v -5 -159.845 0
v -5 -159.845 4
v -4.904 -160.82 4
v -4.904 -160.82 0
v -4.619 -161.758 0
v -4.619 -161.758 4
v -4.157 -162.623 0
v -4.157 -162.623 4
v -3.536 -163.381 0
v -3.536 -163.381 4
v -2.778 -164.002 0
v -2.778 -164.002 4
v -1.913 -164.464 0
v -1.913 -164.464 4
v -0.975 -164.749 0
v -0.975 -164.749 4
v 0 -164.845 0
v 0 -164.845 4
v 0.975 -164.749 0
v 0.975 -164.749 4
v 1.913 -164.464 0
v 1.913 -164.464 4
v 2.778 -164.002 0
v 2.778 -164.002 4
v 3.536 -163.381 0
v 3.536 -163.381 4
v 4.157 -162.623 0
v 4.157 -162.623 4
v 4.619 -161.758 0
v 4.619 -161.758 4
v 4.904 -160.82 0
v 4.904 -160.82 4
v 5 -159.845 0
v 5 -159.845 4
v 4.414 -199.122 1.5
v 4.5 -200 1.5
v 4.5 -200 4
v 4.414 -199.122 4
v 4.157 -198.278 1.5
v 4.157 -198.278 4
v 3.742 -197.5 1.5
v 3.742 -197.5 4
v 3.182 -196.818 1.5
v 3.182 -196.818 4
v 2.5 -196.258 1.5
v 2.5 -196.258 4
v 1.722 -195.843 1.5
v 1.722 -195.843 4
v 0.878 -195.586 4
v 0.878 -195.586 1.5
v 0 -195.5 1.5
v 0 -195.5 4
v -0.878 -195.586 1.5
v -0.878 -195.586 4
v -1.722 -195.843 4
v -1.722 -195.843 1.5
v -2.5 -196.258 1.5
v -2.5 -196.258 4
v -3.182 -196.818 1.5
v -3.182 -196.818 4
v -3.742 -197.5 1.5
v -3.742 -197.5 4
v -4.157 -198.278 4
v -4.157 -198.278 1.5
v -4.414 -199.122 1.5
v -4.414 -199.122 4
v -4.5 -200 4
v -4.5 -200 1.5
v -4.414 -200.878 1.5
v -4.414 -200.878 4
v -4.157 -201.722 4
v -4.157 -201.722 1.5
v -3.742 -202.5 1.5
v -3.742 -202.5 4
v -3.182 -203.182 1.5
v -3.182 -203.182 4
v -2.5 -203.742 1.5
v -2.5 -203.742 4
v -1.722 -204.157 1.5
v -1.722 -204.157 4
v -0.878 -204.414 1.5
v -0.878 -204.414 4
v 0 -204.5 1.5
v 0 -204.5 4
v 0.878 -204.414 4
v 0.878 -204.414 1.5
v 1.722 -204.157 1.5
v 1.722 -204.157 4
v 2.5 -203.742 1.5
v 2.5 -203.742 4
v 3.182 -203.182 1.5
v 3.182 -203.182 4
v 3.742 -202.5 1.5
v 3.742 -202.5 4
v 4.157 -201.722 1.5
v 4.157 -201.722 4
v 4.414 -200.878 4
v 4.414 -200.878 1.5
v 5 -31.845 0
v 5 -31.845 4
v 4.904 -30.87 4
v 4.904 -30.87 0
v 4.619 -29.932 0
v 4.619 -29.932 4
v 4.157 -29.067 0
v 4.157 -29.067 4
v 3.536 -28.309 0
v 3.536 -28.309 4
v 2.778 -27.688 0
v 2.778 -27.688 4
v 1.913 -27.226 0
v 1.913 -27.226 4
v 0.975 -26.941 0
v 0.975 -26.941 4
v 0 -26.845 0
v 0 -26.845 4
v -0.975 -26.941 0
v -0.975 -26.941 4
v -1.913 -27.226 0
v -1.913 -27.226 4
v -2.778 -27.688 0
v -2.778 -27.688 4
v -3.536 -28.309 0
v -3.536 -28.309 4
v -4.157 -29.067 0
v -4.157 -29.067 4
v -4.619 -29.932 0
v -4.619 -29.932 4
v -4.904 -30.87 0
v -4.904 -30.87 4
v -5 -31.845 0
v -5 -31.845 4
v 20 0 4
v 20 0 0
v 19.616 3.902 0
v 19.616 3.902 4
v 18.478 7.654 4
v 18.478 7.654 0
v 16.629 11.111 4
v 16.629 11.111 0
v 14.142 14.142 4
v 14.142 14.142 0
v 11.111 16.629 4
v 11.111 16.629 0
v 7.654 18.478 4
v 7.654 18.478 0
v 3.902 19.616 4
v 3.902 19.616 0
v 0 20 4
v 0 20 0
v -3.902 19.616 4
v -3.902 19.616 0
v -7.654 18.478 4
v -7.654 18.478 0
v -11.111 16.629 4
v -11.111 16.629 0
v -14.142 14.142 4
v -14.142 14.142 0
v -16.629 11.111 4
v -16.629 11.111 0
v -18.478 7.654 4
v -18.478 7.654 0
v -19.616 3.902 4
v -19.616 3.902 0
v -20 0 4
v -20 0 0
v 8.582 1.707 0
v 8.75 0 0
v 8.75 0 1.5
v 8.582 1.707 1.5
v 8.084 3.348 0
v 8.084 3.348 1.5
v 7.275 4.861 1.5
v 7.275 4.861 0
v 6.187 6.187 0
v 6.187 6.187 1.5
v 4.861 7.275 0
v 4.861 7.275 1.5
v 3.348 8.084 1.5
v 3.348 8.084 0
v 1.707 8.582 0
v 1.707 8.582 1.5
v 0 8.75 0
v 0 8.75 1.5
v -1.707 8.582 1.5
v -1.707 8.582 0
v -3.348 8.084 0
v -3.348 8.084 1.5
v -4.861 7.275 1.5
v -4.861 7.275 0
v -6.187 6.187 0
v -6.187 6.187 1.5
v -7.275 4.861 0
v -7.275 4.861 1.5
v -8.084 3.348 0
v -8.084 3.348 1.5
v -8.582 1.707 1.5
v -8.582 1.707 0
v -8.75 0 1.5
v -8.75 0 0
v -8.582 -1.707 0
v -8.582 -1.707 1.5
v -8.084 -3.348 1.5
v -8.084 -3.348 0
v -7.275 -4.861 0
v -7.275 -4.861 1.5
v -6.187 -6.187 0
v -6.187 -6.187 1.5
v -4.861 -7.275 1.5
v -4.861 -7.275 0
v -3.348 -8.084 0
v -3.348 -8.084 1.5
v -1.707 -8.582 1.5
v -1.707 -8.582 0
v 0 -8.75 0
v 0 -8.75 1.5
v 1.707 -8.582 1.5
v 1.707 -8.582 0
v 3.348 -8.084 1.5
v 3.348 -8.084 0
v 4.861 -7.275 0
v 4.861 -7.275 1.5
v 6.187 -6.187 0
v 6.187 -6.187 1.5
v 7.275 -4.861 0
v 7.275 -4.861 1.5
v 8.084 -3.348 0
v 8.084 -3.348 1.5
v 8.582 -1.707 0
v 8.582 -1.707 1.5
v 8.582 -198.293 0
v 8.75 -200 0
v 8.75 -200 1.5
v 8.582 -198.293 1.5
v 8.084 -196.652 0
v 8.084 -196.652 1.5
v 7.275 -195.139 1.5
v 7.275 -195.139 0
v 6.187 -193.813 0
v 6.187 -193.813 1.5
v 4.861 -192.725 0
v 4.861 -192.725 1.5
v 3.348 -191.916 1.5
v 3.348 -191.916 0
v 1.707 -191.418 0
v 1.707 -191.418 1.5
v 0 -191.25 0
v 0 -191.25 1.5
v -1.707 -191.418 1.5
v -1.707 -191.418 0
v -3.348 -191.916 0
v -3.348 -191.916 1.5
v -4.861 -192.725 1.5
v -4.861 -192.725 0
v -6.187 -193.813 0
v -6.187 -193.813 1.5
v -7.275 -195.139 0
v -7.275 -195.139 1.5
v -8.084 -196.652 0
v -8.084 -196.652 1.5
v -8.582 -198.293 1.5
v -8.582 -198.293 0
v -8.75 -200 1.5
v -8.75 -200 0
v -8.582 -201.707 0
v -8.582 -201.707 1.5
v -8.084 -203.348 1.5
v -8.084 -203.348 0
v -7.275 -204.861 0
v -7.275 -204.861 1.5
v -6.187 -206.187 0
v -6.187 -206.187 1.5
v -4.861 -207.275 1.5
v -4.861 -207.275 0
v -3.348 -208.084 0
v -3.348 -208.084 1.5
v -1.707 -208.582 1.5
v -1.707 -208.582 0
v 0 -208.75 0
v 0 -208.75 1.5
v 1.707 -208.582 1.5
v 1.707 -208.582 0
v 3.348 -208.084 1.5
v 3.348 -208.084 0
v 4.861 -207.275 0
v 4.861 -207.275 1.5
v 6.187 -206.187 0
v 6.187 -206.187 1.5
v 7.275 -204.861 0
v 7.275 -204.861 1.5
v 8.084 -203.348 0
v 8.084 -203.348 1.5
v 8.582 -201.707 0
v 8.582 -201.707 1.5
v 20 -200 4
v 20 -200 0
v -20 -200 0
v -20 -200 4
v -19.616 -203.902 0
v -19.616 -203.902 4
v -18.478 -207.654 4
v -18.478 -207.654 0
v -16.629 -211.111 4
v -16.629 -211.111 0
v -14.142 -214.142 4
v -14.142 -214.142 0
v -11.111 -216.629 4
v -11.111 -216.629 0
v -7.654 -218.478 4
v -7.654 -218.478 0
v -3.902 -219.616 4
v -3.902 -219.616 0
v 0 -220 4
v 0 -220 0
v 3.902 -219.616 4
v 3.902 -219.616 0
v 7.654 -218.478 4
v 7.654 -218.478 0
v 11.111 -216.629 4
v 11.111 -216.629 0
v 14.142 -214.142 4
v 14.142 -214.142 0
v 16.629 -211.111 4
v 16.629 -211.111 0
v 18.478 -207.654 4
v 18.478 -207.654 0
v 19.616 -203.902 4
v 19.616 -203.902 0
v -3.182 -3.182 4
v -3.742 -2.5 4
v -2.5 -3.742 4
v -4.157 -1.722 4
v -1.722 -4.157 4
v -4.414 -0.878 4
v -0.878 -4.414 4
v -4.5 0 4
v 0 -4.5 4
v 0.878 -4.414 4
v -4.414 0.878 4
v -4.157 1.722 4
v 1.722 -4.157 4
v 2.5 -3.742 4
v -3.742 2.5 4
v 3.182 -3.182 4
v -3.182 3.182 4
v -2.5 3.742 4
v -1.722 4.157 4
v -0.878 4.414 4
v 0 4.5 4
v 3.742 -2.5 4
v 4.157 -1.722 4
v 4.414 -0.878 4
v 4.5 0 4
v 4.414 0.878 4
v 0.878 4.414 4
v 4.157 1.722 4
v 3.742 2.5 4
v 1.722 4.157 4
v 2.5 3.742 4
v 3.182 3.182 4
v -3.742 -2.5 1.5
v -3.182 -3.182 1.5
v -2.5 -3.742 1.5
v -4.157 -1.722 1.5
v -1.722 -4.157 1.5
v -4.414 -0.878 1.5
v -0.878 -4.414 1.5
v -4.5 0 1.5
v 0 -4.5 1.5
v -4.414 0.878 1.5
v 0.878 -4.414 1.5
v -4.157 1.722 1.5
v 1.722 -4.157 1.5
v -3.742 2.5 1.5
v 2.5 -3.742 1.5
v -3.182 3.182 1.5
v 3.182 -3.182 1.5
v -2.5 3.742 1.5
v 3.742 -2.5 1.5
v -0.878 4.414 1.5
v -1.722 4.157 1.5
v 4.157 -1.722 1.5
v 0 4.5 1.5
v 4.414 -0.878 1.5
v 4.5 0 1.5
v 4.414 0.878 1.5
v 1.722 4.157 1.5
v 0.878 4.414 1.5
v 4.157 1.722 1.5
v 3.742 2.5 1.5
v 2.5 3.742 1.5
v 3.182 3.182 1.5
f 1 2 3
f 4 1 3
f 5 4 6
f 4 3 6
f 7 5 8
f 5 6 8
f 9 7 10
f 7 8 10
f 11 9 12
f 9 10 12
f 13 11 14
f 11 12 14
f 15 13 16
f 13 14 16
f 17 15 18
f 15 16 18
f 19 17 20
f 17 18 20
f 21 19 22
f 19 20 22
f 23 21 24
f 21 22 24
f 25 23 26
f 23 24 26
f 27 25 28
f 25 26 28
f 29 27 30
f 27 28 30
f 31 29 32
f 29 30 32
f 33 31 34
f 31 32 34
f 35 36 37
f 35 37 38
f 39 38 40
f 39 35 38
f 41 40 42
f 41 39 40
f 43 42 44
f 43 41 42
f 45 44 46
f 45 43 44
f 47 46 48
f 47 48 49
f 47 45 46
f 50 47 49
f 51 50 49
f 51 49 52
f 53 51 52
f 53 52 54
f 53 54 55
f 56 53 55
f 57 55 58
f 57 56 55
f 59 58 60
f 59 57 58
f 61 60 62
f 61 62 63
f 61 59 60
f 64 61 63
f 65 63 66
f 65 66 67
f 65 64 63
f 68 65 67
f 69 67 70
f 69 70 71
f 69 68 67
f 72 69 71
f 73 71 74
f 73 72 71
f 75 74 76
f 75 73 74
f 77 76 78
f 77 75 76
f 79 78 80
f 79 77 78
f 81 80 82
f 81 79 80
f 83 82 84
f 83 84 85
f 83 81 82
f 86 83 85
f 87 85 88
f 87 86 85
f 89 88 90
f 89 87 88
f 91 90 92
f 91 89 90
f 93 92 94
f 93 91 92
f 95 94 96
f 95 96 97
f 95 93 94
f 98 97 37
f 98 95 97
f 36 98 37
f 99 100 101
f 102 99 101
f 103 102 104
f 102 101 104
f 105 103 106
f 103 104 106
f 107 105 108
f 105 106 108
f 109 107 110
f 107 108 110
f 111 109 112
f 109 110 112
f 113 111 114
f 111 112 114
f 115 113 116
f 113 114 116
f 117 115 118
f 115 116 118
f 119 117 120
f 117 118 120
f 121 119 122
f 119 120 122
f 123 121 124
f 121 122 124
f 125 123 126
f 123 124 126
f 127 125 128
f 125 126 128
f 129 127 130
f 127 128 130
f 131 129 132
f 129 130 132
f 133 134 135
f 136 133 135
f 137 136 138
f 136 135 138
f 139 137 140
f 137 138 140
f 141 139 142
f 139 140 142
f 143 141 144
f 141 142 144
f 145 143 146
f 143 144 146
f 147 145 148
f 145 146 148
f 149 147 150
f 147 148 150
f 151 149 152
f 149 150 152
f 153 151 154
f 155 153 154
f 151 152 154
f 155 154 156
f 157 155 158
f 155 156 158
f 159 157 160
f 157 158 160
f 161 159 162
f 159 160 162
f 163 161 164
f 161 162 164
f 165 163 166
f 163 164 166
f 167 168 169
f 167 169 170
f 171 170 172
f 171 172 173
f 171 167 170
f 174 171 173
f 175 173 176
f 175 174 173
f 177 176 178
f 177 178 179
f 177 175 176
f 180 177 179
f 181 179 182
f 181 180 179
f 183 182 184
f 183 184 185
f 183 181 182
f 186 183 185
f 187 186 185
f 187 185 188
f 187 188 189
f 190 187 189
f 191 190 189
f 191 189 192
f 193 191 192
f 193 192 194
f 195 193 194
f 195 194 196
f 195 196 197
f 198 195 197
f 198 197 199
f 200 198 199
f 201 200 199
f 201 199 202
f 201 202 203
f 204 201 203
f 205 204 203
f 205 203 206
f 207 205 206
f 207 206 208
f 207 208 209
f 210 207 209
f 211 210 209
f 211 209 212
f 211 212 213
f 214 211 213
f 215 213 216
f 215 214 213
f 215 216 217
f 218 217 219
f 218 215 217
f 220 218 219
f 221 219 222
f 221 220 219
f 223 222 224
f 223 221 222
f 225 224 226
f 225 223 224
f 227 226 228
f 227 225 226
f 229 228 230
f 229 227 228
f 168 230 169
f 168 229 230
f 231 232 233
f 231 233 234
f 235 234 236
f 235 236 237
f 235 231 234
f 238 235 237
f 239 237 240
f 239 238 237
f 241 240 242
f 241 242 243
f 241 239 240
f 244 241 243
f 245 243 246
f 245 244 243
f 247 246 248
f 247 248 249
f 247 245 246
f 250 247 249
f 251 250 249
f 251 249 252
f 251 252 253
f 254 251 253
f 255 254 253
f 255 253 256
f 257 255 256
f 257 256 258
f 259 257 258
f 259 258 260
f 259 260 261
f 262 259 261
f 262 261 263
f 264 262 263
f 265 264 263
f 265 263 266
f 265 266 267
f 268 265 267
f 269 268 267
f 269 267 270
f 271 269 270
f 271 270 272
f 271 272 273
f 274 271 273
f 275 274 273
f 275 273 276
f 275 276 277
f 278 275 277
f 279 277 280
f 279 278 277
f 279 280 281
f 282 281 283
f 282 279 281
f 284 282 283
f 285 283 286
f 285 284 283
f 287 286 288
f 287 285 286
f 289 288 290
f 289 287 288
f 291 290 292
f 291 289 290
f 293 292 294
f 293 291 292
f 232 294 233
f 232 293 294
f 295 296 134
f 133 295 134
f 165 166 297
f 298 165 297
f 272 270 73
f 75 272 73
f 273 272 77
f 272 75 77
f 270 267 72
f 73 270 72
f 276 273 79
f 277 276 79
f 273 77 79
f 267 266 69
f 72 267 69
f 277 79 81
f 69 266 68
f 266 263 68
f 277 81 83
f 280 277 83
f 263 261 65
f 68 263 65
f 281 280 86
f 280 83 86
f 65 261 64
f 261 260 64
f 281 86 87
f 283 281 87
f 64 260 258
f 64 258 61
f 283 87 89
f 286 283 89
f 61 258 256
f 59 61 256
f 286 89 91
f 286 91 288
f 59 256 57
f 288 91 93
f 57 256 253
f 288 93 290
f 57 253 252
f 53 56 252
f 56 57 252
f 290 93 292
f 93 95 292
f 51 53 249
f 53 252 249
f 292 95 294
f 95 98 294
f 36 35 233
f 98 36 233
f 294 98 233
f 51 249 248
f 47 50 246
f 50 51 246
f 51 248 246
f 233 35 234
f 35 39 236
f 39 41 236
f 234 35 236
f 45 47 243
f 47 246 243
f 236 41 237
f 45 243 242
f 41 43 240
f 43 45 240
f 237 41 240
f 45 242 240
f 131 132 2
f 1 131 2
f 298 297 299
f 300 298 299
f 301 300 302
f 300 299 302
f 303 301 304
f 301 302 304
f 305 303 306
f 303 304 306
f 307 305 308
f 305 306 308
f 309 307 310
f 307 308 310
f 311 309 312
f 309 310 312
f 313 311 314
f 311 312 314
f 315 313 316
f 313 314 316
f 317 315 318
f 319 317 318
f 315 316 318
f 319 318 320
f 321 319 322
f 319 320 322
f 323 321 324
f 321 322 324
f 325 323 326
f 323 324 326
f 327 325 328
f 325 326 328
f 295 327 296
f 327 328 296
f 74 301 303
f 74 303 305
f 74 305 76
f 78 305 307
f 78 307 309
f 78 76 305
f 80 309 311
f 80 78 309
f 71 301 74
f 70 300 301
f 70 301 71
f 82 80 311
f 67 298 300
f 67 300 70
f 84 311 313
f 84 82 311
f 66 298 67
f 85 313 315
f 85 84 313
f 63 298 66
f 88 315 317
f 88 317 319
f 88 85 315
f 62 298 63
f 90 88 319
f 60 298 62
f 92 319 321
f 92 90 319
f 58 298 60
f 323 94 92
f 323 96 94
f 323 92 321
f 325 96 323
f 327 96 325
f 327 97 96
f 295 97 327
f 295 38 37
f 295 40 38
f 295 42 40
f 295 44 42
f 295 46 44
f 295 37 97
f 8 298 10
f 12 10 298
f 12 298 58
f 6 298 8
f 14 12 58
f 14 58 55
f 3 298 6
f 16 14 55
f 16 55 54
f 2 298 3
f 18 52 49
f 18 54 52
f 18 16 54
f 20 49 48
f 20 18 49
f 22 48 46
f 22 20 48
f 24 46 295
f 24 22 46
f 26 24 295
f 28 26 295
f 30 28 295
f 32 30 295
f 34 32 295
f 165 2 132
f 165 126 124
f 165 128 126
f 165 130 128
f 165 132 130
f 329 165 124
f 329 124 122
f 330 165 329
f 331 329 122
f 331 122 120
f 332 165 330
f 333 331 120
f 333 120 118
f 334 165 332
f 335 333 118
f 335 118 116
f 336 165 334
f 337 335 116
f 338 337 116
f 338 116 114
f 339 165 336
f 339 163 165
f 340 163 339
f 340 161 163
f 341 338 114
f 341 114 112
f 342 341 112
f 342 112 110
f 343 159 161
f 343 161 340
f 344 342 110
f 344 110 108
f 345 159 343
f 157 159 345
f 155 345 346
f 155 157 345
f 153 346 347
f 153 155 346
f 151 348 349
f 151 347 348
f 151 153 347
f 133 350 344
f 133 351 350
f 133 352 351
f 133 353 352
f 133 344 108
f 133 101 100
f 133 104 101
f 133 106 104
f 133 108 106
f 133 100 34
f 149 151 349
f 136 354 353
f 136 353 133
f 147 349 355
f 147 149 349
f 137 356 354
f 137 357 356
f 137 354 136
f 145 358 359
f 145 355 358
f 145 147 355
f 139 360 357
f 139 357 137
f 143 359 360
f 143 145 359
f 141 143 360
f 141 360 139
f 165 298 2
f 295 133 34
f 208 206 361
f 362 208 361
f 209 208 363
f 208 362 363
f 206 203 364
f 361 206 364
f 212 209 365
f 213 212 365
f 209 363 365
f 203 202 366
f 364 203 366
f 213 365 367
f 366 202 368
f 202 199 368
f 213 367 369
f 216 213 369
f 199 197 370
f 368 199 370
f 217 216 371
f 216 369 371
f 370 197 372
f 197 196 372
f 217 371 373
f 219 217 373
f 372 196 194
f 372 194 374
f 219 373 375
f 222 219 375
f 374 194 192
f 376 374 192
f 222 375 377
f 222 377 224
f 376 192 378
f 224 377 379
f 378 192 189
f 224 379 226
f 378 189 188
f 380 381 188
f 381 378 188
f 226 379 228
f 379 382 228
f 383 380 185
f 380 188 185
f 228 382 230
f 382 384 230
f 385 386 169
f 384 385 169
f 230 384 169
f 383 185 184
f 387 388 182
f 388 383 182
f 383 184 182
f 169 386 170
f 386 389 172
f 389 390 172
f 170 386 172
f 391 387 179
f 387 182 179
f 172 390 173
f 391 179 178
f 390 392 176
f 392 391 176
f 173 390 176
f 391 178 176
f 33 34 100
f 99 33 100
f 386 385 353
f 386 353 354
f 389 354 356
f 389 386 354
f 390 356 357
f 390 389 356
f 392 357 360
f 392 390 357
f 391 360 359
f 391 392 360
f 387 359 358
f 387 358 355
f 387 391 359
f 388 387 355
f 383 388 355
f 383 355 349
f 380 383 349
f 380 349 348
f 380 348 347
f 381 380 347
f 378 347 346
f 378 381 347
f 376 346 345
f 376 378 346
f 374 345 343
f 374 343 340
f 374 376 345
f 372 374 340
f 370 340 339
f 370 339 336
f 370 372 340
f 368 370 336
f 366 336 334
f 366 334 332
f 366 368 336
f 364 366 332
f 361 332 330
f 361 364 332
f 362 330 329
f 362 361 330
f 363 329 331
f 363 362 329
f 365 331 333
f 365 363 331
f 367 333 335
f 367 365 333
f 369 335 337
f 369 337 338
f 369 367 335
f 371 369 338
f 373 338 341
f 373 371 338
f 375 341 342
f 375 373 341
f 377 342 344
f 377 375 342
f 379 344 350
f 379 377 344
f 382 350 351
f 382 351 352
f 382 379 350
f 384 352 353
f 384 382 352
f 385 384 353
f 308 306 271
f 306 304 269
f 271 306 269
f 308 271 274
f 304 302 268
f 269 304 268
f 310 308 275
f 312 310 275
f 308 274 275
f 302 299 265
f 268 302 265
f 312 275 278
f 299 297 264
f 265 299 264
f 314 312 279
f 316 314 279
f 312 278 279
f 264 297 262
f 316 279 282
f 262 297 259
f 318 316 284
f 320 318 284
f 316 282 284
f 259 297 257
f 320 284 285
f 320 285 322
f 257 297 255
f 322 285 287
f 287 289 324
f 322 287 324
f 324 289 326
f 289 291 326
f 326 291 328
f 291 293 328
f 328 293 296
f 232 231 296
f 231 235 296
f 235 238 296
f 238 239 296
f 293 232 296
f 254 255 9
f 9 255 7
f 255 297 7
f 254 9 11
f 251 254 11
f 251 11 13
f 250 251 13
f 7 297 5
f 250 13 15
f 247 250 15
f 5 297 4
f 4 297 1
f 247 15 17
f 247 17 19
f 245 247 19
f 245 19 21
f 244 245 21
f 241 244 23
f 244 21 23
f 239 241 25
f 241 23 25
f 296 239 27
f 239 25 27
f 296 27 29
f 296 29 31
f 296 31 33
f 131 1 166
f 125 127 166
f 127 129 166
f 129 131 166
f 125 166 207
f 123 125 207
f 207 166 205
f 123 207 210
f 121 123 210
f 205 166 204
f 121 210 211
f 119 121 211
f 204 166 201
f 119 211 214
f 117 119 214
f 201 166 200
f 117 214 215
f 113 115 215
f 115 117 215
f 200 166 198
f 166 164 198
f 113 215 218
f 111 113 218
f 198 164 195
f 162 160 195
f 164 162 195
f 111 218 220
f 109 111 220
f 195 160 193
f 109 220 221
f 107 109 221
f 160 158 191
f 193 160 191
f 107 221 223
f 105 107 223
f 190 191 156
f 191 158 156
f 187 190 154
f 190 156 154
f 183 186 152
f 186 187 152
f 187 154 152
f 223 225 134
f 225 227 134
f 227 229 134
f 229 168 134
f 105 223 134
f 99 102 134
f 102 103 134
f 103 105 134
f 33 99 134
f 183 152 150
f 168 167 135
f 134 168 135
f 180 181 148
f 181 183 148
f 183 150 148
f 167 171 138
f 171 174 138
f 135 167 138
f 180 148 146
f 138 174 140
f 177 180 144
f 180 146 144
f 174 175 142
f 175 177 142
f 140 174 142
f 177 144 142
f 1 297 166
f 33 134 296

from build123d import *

# Parameters (mm, degrees)
SKETCH_1_R          = 8.75
EXTRUDE_1_DEPTH     = 4
EXTRUDE_START       = -2.5
SKETCH_3_R          = 8.75
SKETCH_3_R_2        = 4.5
EXTRUDE_2_DEPTH     = 2.5
CUT_EXTRUDE_2_DEPTH = 221.943431674


with BuildPart() as part:
    # 草图1 → 凸台-拉伸1 (new body)
    with BuildSketch(Plane.XY):
        with BuildLine():
            Line((-20, 0), (-20, -200))
            ThreePointArc((-20, -200), (0, -220), (20, -200))
            Line((20, -200), (20, 0))
            ThreePointArc((20, 0), (0, 20), (-20, 0))
        make_face()
        Circle(SKETCH_1_R, mode=Mode.SUBTRACT)
        with Locations((0, -200)):
            Circle(SKETCH_1_R, mode=Mode.SUBTRACT)
    extrude(amount=EXTRUDE_1_DEPTH)

    # 草图3 → 凸台-拉伸2 (add)
    # profile 1 of 2: a face of its own
    with BuildSketch(Plane.XY.offset(4).offset(EXTRUDE_START)):
        Circle(SKETCH_3_R)
        Circle(SKETCH_3_R_2, mode=Mode.SUBTRACT)
    # profile 2 of 2: a face of its own
    with BuildSketch(Plane.XY.offset(4).offset(EXTRUDE_START)):
        with Locations((0, -200)):
            Circle(SKETCH_3_R)
        with Locations((0, -200)):
            Circle(SKETCH_3_R_2, mode=Mode.SUBTRACT)
    extrude(amount=EXTRUDE_2_DEPTH)

    # 草图2 → 切除-拉伸2 (cut, through all)
    with BuildSketch(Plane.XY.offset(4)):
        with BuildLine():
            Line((-5, -31.845004689), (-5, -159.845004689))
            ThreePointArc((-5, -159.845004689), (0, -164.845004689), (5, -159.845004689))
            Line((5, -159.845004689), (5, -31.845004689))
            ThreePointArc((5, -31.845004689), (0, -26.845004689), (-5, -31.845004689))
        make_face()
    extrude(amount=-CUT_EXTRUDE_2_DEPTH, mode=Mode.SUBTRACT)


solid = part.part
